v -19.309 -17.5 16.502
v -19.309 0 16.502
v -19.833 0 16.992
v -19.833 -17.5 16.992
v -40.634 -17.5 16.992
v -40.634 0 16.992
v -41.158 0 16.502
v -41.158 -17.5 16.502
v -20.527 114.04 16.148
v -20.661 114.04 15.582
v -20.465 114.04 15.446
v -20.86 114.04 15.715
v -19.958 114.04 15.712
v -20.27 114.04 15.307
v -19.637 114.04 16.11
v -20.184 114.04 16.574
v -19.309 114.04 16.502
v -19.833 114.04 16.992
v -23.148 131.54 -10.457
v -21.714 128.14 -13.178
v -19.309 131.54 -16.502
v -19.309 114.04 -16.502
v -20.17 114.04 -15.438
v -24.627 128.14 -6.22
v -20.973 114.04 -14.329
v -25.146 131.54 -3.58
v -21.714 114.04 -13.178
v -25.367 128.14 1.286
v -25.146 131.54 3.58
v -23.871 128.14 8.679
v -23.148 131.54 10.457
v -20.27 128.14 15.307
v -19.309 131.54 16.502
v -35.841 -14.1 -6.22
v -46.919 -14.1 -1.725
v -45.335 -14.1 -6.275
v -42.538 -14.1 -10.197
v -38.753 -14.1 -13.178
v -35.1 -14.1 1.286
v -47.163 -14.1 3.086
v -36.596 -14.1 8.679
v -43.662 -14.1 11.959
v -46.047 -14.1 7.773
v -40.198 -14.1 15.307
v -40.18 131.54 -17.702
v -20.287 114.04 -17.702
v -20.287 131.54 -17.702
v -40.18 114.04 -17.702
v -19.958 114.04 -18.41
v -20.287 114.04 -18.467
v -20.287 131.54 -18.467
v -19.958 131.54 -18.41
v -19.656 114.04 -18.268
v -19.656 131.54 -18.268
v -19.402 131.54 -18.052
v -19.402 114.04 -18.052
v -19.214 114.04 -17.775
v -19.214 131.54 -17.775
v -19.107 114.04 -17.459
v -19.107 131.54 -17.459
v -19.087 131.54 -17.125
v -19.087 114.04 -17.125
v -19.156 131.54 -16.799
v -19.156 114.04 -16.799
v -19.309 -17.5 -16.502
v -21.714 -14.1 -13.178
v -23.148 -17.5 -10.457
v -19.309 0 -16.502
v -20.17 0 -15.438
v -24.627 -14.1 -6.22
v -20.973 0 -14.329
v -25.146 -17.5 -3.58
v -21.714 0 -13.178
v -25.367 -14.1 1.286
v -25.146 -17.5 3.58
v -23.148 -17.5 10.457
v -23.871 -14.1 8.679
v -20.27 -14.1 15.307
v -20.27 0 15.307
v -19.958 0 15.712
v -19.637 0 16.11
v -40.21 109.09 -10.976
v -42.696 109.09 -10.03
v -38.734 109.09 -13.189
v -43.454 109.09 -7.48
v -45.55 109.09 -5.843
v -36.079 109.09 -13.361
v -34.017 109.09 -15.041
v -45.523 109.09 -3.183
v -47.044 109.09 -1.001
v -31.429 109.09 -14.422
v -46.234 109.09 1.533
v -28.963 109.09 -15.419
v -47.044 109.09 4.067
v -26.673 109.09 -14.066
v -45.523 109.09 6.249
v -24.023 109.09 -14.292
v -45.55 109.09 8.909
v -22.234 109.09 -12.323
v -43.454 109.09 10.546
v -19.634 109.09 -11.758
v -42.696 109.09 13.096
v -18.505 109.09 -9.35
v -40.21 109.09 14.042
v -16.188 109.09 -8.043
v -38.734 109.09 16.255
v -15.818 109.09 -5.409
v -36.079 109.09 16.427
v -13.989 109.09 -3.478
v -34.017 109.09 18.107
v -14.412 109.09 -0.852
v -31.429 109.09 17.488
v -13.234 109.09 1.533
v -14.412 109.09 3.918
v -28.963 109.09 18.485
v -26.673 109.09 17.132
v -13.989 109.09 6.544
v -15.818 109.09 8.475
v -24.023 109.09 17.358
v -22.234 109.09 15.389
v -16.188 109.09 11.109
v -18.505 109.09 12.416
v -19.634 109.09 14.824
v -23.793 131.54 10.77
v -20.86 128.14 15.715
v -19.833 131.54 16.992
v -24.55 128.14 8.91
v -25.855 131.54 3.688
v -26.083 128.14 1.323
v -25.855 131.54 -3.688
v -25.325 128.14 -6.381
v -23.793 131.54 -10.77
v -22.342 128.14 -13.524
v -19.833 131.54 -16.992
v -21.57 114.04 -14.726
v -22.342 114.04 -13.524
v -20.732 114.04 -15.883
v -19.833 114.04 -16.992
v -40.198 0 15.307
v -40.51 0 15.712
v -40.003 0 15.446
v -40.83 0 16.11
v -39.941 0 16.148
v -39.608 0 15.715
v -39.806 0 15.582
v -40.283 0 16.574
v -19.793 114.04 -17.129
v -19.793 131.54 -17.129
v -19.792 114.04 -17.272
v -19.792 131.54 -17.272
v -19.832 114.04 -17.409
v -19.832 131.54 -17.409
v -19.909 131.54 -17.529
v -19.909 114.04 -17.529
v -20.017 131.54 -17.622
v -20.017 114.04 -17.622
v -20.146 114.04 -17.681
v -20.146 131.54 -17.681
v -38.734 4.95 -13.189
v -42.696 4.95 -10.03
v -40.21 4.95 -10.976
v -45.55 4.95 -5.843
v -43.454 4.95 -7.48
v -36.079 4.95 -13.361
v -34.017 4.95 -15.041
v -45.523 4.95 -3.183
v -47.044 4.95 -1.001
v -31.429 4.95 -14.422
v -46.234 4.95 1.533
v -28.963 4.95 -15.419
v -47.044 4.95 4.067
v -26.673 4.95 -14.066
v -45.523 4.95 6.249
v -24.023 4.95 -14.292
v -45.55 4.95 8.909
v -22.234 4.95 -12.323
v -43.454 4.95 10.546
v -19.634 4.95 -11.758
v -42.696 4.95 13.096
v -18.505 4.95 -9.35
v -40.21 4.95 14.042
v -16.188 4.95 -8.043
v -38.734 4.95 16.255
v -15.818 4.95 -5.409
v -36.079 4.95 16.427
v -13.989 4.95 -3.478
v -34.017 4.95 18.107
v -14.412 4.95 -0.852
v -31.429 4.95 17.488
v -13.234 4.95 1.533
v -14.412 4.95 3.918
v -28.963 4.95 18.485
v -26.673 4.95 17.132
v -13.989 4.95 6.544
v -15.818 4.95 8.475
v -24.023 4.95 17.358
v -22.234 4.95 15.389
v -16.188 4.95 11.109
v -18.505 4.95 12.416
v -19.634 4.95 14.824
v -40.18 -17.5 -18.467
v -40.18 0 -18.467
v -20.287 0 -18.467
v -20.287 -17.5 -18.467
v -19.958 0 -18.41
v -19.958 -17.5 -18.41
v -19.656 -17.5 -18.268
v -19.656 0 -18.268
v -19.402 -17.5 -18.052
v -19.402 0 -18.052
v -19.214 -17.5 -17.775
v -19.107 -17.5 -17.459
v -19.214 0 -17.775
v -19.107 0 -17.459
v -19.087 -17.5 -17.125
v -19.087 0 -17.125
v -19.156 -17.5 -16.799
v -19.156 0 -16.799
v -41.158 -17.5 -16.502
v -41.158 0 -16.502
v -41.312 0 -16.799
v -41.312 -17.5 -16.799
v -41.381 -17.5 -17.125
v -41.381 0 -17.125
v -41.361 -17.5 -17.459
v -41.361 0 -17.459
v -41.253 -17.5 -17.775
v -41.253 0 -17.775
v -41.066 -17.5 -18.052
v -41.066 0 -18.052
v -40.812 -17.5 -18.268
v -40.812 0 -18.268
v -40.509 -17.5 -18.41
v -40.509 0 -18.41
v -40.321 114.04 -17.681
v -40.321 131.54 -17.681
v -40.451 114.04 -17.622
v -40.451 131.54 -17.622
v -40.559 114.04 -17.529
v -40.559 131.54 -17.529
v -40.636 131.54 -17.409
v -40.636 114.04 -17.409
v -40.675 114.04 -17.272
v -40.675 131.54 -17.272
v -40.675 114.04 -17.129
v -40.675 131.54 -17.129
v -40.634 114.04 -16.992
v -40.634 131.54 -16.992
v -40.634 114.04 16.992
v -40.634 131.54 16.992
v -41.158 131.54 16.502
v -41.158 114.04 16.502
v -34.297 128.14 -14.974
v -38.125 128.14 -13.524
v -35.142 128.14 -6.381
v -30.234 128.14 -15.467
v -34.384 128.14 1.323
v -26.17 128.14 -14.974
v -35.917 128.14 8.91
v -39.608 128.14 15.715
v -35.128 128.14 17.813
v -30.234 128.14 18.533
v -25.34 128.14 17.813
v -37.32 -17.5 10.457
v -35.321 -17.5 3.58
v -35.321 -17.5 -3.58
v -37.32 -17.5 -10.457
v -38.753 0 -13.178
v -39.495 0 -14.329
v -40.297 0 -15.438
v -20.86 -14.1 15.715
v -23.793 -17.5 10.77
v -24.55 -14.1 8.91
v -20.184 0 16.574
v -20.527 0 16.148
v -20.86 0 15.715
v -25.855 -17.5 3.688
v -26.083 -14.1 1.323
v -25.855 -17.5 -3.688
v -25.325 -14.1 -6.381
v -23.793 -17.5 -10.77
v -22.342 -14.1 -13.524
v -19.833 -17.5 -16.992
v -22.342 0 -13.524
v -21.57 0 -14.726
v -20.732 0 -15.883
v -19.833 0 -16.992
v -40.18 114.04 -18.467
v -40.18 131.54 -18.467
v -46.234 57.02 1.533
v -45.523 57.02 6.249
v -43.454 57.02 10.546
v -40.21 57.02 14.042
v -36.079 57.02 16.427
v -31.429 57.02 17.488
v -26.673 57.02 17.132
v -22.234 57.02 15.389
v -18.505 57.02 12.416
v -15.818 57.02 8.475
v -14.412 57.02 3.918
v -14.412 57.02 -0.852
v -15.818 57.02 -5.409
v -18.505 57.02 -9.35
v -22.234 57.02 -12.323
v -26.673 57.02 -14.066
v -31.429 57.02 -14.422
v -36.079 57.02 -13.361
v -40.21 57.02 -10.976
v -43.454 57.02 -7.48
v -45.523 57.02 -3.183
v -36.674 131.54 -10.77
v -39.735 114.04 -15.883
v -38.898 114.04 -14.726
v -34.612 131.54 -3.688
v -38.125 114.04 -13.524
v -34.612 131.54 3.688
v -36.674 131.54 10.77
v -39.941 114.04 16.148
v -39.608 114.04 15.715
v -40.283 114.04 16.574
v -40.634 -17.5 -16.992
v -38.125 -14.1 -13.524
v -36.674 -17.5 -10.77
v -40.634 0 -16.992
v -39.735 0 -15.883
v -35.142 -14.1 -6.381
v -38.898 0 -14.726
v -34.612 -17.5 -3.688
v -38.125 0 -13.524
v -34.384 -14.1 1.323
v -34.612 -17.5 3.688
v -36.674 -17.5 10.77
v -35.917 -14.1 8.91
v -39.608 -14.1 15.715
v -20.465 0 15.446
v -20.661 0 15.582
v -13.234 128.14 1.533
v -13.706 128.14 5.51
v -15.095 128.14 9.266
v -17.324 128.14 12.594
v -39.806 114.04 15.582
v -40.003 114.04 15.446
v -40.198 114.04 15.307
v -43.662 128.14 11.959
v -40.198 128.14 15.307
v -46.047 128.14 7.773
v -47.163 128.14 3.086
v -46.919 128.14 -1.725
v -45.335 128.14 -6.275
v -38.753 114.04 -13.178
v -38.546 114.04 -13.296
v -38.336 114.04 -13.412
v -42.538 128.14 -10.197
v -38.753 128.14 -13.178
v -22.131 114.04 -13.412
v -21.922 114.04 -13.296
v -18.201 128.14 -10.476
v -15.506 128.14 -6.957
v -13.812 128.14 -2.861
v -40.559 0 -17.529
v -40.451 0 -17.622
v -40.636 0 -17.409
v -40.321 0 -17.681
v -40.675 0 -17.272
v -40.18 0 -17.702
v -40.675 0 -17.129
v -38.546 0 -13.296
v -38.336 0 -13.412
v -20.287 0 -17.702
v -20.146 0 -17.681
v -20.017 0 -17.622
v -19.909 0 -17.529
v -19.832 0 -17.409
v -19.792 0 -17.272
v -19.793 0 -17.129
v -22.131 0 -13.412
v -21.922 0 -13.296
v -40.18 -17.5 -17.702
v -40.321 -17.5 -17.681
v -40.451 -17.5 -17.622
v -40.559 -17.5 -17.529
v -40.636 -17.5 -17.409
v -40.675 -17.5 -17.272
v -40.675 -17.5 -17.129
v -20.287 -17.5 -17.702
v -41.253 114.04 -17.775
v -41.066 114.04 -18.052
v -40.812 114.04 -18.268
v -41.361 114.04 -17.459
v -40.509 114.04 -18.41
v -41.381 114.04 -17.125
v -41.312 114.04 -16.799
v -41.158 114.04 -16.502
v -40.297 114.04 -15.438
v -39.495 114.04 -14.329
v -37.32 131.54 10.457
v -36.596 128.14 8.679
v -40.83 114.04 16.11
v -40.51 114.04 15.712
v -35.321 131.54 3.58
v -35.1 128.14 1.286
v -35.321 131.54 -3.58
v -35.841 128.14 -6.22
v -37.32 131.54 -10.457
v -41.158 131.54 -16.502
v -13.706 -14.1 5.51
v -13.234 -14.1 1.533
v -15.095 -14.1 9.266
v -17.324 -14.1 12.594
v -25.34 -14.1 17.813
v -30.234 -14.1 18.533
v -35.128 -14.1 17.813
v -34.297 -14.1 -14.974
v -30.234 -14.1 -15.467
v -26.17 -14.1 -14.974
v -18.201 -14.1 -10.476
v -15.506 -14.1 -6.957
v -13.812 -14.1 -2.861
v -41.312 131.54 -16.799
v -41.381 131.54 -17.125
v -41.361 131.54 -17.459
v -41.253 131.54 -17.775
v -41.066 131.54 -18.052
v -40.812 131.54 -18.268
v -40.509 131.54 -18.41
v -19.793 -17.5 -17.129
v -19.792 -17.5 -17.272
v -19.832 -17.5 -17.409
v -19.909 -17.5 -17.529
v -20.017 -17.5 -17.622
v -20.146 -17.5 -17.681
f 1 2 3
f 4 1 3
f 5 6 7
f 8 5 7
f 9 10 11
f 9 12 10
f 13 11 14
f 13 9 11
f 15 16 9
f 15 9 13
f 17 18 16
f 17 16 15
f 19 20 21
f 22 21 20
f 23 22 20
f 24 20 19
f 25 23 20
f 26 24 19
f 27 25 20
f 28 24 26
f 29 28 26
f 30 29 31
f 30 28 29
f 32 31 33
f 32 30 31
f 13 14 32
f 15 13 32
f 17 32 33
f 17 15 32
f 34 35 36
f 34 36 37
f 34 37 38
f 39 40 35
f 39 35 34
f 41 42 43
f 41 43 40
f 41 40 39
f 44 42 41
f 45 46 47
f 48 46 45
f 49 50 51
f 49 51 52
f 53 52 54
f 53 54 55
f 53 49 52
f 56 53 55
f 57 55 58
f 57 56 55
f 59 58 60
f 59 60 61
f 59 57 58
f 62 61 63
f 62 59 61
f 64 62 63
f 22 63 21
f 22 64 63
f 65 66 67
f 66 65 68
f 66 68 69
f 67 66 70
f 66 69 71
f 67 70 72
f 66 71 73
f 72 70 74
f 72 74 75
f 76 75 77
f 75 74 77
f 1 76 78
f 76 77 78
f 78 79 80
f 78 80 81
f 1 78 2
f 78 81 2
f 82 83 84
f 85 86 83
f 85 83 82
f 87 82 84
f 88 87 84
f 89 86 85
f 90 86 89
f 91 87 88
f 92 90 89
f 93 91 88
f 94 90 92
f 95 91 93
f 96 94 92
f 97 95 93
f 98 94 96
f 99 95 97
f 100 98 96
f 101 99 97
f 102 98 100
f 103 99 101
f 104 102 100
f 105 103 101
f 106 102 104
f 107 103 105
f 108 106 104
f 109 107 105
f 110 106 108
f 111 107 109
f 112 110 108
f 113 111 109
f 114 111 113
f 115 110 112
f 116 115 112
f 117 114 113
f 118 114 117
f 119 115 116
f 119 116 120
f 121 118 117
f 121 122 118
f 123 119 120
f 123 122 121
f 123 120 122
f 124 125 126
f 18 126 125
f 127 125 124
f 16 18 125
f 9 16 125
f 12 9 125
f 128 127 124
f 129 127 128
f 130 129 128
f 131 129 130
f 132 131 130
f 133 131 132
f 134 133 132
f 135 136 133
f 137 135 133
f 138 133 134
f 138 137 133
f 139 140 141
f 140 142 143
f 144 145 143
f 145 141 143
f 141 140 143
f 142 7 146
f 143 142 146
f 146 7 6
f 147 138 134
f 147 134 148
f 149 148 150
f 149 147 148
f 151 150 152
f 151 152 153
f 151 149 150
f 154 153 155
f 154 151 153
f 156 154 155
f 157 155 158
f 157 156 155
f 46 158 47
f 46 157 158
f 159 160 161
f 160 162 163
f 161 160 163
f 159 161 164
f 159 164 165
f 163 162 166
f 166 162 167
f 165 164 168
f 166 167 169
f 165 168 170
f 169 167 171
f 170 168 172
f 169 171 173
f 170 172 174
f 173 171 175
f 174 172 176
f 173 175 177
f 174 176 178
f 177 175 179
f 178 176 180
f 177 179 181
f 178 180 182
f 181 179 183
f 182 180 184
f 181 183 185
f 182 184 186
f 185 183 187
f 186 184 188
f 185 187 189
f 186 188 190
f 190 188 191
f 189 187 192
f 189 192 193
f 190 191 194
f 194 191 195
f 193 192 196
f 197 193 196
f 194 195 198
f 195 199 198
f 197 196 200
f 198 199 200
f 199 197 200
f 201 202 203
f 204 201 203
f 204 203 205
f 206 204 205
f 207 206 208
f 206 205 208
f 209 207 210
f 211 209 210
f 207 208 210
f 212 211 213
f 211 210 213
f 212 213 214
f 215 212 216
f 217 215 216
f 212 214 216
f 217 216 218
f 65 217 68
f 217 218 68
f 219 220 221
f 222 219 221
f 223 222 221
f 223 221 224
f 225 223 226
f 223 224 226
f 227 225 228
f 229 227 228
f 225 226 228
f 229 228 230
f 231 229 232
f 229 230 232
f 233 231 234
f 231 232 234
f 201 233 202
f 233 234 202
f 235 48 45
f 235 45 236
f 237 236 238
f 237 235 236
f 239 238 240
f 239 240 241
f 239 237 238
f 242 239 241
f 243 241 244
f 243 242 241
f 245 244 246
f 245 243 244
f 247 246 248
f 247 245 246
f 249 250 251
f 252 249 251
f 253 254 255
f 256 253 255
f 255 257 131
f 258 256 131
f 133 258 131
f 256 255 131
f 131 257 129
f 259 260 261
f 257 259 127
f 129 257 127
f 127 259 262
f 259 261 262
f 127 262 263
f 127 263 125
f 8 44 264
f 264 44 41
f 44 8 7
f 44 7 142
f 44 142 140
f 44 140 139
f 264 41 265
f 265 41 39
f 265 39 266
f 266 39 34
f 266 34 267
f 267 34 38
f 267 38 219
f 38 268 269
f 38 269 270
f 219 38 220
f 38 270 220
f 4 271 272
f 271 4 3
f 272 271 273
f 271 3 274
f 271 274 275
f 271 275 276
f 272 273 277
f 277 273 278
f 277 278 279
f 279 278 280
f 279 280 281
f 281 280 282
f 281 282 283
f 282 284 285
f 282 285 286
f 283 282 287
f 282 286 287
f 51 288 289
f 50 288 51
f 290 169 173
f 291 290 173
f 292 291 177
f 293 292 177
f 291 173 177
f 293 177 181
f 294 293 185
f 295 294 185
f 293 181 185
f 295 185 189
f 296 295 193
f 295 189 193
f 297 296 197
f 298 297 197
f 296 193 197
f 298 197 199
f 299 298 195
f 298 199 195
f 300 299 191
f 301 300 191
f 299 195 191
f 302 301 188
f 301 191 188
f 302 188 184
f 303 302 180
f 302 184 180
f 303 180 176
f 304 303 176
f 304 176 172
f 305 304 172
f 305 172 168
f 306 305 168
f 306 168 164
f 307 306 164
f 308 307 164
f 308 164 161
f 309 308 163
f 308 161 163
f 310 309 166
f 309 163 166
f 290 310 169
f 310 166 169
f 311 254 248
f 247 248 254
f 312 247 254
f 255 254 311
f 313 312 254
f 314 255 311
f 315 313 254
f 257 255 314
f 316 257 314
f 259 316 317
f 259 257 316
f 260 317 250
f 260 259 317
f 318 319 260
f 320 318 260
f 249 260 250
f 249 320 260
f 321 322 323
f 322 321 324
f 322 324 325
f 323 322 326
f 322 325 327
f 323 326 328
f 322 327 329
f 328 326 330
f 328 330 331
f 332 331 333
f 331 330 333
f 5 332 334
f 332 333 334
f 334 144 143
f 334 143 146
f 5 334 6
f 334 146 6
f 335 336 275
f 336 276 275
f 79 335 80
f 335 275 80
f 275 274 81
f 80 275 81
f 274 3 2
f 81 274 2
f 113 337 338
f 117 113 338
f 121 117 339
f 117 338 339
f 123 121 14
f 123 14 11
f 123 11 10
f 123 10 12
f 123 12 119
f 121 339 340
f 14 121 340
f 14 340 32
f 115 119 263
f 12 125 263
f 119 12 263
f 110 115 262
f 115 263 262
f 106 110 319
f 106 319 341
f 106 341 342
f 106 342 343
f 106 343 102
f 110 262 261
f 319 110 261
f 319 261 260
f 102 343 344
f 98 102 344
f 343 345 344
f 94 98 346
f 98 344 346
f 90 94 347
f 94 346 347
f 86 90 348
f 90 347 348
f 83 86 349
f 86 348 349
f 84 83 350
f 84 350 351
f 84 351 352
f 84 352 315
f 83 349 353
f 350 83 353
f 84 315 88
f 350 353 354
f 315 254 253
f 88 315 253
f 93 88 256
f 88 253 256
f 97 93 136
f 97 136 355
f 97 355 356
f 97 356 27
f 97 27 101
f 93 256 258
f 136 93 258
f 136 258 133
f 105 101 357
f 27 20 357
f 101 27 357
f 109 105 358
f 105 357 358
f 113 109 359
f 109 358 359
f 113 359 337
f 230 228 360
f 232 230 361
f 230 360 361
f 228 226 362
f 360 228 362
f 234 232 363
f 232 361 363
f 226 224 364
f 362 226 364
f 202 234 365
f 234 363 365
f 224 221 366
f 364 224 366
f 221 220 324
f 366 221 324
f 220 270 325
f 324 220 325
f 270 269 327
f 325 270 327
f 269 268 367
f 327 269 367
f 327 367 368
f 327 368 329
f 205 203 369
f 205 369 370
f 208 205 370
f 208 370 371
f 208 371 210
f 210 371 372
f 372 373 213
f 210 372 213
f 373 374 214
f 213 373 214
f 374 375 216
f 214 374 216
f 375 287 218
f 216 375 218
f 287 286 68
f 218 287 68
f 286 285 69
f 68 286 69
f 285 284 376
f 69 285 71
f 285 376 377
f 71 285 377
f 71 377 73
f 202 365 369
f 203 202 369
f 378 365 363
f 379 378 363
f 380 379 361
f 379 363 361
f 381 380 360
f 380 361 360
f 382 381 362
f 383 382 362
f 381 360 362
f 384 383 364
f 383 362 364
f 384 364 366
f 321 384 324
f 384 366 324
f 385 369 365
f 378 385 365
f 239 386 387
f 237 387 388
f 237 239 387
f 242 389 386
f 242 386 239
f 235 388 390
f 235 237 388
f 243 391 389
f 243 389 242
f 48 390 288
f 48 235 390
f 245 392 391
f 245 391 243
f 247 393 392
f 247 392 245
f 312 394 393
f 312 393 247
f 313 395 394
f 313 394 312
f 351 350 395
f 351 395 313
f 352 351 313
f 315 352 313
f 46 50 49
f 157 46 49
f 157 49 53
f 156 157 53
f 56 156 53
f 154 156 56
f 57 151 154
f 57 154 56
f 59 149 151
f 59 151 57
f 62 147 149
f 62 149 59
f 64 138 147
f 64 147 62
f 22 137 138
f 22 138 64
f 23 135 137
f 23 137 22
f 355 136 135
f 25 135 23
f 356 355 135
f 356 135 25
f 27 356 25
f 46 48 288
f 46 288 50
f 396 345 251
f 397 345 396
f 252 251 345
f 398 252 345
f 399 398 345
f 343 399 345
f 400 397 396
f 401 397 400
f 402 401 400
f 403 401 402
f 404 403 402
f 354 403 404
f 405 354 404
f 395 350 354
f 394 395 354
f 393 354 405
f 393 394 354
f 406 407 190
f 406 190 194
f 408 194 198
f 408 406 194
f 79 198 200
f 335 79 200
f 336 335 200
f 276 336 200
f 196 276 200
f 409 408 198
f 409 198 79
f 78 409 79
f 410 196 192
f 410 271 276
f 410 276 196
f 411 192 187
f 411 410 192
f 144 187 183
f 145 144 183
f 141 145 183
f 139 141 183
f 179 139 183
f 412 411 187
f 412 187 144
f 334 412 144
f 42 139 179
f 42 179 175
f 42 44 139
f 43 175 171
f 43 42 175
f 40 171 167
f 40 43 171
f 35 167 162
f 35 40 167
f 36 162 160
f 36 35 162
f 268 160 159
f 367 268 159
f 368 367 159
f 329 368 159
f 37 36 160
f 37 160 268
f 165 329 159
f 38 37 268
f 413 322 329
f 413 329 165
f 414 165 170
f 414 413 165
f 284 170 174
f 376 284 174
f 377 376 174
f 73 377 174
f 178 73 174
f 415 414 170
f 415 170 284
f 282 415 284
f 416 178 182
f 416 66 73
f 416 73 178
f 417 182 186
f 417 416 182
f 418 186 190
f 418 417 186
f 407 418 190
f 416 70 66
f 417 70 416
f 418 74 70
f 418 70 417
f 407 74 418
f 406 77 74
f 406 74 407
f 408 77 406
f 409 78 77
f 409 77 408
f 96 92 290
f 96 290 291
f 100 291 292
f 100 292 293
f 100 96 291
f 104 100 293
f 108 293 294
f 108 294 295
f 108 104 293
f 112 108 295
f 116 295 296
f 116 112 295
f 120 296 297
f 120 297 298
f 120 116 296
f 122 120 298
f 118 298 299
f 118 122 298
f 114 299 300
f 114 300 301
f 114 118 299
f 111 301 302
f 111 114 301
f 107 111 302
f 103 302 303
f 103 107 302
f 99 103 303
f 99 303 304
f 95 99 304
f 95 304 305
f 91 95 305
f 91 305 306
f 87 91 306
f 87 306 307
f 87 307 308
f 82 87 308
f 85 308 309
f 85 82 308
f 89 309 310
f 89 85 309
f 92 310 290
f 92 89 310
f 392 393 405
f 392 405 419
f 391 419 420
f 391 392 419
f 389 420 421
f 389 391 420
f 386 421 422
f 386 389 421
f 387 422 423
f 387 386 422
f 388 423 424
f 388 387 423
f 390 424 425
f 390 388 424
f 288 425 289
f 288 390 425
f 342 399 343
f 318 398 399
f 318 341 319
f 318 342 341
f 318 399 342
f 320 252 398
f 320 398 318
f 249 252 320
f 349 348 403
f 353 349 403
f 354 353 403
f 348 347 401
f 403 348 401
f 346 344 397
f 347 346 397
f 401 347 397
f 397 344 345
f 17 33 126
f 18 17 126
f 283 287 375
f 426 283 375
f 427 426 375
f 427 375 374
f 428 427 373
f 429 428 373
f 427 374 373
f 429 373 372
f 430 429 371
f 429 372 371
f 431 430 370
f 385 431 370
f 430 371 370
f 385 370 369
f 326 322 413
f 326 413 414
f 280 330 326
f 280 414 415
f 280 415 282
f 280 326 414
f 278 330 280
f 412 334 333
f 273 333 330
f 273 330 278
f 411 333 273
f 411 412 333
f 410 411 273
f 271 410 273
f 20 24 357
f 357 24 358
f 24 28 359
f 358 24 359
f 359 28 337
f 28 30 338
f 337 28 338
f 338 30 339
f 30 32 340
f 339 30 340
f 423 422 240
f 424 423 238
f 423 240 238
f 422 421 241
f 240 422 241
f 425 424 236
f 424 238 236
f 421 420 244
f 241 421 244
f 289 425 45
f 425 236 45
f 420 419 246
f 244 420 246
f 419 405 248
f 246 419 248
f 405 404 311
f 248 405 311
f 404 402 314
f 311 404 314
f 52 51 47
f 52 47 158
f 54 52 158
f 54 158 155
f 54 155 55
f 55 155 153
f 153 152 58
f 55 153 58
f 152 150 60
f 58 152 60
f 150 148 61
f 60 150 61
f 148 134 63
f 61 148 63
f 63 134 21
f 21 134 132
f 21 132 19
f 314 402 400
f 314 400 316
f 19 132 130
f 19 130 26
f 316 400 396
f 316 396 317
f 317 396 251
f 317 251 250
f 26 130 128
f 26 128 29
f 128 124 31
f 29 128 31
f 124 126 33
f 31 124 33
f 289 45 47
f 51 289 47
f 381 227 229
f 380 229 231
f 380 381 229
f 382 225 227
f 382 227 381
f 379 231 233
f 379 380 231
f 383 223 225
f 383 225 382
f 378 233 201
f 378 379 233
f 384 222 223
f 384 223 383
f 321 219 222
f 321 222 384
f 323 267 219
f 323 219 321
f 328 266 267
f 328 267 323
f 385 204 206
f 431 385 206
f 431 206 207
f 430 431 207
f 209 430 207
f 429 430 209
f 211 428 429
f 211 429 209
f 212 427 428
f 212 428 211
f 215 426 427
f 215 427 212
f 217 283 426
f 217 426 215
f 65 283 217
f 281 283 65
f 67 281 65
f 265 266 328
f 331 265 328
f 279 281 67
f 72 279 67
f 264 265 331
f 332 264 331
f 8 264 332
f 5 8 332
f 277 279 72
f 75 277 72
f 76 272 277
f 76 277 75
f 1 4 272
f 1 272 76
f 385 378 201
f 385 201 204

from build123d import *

# Parameters (mm, degrees)
F1_DEPTH = 17.5
F3_R     = 17
F4_DEPTH = 19.05
F5_R     = 16
F6_DEPTH = 52.07


with BuildPart() as f1:
    # F0 (on Front) → F1 (new body)
    with BuildSketch(Plane.XZ):
        with BuildLine():
            Line((-19.309289, 16.501859), (-19.833244, 16.992354))
            ThreePointArc((-19.833244, 16.992354), (-26.117, 0), (-19.833244, -16.992354))
            Line((-19.833244, -16.992354), (-19.309289, -16.501859))
            ThreePointArc((-19.309289, -16.501859), (-25.4, 0), (-19.309289, 16.501859))
        make_face()
        with BuildLine():
            Line((-19.309289, -16.501859), (-19.833244, -16.992354))
            ThreePointArc((-19.833244, -16.992354), (-19.866141, -17.4713), (-20.287276, -17.701772))
            Line((-20.287276, -17.701772), (-40.180276, -17.701772))
            Line((-40.180276, -17.701772), (-40.180276, -18.466977))
            Line((-40.180276, -18.466977), (-20.287276, -18.466977))
            ThreePointArc((-20.287276, -18.466977), (-19.214267, -17.775067), (-19.309289, -16.501859))
        make_face()
        with BuildLine():
            Line((-40.180276, -18.466977), (-40.180276, -17.701772))
            ThreePointArc((-40.180276, -17.701772), (-40.60141, -17.4713), (-40.634307, -16.992354))
            Line((-40.634307, -16.992354), (-41.158262, -16.501859))
            ThreePointArc((-41.158262, -16.501859), (-41.253285, -17.775067), (-40.180276, -18.466977))
        make_face()
        with BuildLine():
            Line((-41.158262, -16.501859), (-40.634307, -16.992354))
            ThreePointArc((-40.634307, -16.992354), (-34.350551, 0), (-40.634307, 16.992354))
            Line((-40.634307, 16.992354), (-41.158262, 16.501859))
            ThreePointArc((-41.158262, 16.501859), (-35.067551, 0), (-41.158262, -16.501859))
        make_face()
    extrude(amount=F1_DEPTH)

    # F3 (on offset) → F4 (join)
    with BuildSketch(Plane.XZ.offset(14.1)):
        with Locations((-30.233776, 1.533023)):
            Circle(F3_R)
    extrude(amount=-F4_DEPTH)

    # F5 (on face) → F6 (join)
    with BuildSketch(Plane(origin=(0, 4.95, 0), x_dir=(-1, 0, 0), z_dir=(0, 1, 0))):
        with Locations((30.233776, 1.533023)):
            Circle(F5_R)
    extrude(amount=F6_DEPTH)

    # F8: F1 across plane


with BuildPart() as f1_1:
    add(f1.part)
    add(f1.part.mirror(Plane.XZ.offset(-57.02)))


solid = f1_1.part
